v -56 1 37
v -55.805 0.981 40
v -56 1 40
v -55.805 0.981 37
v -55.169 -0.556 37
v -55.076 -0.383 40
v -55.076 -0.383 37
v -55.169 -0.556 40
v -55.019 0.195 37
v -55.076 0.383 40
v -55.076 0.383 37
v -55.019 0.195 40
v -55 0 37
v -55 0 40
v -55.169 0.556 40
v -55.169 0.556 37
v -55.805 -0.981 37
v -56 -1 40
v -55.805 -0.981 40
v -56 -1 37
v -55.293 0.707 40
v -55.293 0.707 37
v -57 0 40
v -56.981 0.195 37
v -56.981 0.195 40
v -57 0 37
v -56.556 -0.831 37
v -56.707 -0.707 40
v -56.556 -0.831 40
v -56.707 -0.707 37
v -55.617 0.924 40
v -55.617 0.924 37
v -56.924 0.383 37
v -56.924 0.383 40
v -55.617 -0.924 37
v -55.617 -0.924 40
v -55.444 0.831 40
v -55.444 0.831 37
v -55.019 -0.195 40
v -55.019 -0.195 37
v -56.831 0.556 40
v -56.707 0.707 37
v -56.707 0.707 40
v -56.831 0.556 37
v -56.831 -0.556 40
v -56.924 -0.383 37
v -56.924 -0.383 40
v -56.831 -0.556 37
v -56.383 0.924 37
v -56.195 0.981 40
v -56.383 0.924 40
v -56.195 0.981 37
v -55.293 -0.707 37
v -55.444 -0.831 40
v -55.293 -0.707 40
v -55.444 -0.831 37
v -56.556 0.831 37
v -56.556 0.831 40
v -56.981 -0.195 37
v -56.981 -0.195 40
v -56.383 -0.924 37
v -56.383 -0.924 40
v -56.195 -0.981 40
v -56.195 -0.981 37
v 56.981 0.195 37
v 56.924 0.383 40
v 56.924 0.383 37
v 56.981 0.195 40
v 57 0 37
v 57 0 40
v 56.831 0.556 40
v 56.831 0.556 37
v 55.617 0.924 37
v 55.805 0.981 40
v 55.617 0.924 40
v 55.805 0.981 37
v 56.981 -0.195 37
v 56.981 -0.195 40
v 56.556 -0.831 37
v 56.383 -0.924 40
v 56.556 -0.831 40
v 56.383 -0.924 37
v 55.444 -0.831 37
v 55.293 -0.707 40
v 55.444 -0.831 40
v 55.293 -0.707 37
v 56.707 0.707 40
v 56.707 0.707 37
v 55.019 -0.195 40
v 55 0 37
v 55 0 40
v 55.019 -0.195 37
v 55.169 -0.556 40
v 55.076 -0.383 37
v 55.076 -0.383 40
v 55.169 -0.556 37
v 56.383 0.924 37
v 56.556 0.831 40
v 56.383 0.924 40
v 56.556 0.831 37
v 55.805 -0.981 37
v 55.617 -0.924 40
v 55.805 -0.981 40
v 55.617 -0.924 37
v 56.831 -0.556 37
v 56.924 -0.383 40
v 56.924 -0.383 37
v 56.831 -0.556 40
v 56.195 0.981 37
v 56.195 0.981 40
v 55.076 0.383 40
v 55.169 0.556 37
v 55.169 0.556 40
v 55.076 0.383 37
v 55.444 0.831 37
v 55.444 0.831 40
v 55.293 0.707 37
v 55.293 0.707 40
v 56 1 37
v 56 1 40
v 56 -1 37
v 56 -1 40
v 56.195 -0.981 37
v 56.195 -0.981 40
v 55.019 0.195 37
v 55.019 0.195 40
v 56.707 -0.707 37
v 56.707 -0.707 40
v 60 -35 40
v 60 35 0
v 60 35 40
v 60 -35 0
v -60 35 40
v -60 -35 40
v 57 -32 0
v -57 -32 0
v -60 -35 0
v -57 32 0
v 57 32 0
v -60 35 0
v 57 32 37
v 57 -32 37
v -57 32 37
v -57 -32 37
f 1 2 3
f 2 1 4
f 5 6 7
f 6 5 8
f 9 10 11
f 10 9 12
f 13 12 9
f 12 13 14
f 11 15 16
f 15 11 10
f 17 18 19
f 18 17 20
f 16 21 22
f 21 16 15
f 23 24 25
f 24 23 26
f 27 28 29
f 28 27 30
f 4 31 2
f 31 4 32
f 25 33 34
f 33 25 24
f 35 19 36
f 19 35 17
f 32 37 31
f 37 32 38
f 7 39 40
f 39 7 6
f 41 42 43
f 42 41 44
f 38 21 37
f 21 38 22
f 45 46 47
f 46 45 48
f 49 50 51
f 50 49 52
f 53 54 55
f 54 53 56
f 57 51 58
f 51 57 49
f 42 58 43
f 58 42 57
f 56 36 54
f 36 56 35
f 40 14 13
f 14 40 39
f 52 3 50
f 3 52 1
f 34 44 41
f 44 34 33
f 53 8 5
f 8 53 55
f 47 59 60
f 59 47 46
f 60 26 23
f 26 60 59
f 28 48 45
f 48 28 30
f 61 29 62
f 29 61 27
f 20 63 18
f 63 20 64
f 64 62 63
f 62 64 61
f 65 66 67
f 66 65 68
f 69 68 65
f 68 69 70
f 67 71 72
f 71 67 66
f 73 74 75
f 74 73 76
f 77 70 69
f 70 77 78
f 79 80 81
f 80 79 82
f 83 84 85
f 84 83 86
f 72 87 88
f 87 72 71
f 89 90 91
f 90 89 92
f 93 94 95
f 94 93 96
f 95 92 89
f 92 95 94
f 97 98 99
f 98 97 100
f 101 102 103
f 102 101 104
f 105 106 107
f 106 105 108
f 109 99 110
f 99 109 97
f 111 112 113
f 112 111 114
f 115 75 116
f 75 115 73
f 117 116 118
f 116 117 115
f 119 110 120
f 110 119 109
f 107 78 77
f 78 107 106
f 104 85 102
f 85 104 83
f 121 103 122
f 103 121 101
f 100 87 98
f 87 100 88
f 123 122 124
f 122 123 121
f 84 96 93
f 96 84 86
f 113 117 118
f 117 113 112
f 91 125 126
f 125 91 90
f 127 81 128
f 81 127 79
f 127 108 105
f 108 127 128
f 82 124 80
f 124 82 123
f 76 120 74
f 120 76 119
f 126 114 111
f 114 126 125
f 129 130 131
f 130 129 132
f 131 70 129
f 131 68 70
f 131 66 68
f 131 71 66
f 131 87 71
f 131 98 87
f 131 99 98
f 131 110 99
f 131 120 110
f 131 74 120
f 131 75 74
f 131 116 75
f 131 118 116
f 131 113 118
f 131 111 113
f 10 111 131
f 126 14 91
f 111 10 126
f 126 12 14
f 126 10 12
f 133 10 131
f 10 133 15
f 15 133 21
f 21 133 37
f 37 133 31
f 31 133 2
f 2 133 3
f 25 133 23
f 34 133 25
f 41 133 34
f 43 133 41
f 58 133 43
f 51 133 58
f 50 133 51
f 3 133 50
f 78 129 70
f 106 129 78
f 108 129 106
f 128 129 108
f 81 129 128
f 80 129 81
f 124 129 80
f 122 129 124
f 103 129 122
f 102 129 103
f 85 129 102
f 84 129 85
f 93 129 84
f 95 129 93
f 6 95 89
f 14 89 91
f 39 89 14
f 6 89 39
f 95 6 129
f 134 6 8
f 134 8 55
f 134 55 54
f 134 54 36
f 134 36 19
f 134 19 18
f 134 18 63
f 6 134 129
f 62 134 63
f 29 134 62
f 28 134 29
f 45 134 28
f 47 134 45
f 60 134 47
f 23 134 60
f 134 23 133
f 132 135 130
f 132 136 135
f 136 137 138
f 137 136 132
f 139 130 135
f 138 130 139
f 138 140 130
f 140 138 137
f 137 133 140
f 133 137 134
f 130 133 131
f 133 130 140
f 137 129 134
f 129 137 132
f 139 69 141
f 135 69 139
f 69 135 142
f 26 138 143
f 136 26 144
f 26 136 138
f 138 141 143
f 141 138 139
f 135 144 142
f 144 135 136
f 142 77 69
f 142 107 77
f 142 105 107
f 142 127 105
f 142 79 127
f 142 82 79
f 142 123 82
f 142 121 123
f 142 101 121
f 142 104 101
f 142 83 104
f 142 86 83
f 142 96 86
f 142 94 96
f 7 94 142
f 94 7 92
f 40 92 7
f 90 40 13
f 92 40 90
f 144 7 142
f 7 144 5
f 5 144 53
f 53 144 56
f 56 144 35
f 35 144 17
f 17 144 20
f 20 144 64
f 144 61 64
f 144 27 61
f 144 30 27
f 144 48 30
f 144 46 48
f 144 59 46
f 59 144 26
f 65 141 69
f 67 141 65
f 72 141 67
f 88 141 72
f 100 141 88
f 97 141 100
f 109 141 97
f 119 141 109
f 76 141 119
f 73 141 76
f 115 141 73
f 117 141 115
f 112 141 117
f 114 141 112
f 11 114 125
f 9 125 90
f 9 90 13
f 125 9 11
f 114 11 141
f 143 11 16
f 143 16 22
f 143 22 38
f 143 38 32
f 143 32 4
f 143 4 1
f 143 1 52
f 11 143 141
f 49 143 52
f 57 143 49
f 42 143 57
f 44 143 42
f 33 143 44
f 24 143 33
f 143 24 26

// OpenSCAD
// Mini horizontal gel-electrophoresis buffer tank.
// Outer dimensions: 120mm (X) x 70mm (Y) x 40mm (Z).
// Wall thickness: 3mm. Floor thickness: 3mm.
// Internal platform: 60mm long (X), full width (Y), 10mm high above inner floor.
// Electrode holes: 2mm diameter, horizontal along X, at ends (X=±), y=0, z=30.

$fn = 64;

// Outer dimensions
X_OUT = 120;
Y_OUT = 70;
Z_OUT = 40;

// Thicknesses
wall_thick = 3;
floor_thick = 3;

// Derived inner dimensions
X_IN  = X_OUT - 2 * wall_thick;
Y_IN  = Y_OUT - 2 * wall_thick;
Z_IN  = Z_OUT - floor_thick; // Open top, so Z height is just Z_OUT

// Platform dimensions
plat_len = 60;
plat_w   = Y_IN;
plat_h   = 10; // Height above inner floor

// Electrode hole specs
hole_d   = 2;
hole_y   = 0;
hole_z   = 30;

// Build the tank body (hollow box with floor)
// We build the outer shell and subtract the inner void.
// The inner void is split by the platform.

difference() {
    // 1. The solid outer block
    translate([-X_OUT/2, -Y_OUT/2, 0]) 
        cube([X_OUT, Y_OUT, Z_OUT]);

    // 2. The inner void (everything inside the walls)
    // We define the void as a union of two parts: the bottom chamber and the top chamber.
    // Bottom chamber: From z=0 to z=plat_h.
    // Top chamber: From z=plat_h to z=Z_IN.
    
    // Bottom void part (under the platform)
    translate([-X_IN/2, -Y_IN/2, 0]) 
        cube([X_IN, Y_IN, plat_h]);

    // Top void part (above the platform)
    translate([-X_IN/2, -Y_IN/2, plat_h]) 
        cube([X_IN, Y_IN, Z_IN - plat_h]);

    // 3. The platform itself (solid block inside the void)
    // Positioned at X = 0, Y = -Y_IN/2 to Y_IN/2, Z = plat_h to plat_h + plat_h
    translate([-plat_len/2, -plat_w/2, plat_h]) 
        cube([plat_len, plat_w, plat_h]);

    // 4. Electrode holes
    // Two holes, one at each end (X = +/- X_IN/2), centered in Y (y=0), at z=hole_z.
    // The hole is a cylinder along the X axis (spanning the length of the tank).
    for (x_pos = [-1, 1]) {
        translate([x_pos * (X_IN/2 - hole_d/2), hole_y, hole_z]) 
            cylinder(h = X_IN, d = hole_d, $fn = 32);
    }
}
